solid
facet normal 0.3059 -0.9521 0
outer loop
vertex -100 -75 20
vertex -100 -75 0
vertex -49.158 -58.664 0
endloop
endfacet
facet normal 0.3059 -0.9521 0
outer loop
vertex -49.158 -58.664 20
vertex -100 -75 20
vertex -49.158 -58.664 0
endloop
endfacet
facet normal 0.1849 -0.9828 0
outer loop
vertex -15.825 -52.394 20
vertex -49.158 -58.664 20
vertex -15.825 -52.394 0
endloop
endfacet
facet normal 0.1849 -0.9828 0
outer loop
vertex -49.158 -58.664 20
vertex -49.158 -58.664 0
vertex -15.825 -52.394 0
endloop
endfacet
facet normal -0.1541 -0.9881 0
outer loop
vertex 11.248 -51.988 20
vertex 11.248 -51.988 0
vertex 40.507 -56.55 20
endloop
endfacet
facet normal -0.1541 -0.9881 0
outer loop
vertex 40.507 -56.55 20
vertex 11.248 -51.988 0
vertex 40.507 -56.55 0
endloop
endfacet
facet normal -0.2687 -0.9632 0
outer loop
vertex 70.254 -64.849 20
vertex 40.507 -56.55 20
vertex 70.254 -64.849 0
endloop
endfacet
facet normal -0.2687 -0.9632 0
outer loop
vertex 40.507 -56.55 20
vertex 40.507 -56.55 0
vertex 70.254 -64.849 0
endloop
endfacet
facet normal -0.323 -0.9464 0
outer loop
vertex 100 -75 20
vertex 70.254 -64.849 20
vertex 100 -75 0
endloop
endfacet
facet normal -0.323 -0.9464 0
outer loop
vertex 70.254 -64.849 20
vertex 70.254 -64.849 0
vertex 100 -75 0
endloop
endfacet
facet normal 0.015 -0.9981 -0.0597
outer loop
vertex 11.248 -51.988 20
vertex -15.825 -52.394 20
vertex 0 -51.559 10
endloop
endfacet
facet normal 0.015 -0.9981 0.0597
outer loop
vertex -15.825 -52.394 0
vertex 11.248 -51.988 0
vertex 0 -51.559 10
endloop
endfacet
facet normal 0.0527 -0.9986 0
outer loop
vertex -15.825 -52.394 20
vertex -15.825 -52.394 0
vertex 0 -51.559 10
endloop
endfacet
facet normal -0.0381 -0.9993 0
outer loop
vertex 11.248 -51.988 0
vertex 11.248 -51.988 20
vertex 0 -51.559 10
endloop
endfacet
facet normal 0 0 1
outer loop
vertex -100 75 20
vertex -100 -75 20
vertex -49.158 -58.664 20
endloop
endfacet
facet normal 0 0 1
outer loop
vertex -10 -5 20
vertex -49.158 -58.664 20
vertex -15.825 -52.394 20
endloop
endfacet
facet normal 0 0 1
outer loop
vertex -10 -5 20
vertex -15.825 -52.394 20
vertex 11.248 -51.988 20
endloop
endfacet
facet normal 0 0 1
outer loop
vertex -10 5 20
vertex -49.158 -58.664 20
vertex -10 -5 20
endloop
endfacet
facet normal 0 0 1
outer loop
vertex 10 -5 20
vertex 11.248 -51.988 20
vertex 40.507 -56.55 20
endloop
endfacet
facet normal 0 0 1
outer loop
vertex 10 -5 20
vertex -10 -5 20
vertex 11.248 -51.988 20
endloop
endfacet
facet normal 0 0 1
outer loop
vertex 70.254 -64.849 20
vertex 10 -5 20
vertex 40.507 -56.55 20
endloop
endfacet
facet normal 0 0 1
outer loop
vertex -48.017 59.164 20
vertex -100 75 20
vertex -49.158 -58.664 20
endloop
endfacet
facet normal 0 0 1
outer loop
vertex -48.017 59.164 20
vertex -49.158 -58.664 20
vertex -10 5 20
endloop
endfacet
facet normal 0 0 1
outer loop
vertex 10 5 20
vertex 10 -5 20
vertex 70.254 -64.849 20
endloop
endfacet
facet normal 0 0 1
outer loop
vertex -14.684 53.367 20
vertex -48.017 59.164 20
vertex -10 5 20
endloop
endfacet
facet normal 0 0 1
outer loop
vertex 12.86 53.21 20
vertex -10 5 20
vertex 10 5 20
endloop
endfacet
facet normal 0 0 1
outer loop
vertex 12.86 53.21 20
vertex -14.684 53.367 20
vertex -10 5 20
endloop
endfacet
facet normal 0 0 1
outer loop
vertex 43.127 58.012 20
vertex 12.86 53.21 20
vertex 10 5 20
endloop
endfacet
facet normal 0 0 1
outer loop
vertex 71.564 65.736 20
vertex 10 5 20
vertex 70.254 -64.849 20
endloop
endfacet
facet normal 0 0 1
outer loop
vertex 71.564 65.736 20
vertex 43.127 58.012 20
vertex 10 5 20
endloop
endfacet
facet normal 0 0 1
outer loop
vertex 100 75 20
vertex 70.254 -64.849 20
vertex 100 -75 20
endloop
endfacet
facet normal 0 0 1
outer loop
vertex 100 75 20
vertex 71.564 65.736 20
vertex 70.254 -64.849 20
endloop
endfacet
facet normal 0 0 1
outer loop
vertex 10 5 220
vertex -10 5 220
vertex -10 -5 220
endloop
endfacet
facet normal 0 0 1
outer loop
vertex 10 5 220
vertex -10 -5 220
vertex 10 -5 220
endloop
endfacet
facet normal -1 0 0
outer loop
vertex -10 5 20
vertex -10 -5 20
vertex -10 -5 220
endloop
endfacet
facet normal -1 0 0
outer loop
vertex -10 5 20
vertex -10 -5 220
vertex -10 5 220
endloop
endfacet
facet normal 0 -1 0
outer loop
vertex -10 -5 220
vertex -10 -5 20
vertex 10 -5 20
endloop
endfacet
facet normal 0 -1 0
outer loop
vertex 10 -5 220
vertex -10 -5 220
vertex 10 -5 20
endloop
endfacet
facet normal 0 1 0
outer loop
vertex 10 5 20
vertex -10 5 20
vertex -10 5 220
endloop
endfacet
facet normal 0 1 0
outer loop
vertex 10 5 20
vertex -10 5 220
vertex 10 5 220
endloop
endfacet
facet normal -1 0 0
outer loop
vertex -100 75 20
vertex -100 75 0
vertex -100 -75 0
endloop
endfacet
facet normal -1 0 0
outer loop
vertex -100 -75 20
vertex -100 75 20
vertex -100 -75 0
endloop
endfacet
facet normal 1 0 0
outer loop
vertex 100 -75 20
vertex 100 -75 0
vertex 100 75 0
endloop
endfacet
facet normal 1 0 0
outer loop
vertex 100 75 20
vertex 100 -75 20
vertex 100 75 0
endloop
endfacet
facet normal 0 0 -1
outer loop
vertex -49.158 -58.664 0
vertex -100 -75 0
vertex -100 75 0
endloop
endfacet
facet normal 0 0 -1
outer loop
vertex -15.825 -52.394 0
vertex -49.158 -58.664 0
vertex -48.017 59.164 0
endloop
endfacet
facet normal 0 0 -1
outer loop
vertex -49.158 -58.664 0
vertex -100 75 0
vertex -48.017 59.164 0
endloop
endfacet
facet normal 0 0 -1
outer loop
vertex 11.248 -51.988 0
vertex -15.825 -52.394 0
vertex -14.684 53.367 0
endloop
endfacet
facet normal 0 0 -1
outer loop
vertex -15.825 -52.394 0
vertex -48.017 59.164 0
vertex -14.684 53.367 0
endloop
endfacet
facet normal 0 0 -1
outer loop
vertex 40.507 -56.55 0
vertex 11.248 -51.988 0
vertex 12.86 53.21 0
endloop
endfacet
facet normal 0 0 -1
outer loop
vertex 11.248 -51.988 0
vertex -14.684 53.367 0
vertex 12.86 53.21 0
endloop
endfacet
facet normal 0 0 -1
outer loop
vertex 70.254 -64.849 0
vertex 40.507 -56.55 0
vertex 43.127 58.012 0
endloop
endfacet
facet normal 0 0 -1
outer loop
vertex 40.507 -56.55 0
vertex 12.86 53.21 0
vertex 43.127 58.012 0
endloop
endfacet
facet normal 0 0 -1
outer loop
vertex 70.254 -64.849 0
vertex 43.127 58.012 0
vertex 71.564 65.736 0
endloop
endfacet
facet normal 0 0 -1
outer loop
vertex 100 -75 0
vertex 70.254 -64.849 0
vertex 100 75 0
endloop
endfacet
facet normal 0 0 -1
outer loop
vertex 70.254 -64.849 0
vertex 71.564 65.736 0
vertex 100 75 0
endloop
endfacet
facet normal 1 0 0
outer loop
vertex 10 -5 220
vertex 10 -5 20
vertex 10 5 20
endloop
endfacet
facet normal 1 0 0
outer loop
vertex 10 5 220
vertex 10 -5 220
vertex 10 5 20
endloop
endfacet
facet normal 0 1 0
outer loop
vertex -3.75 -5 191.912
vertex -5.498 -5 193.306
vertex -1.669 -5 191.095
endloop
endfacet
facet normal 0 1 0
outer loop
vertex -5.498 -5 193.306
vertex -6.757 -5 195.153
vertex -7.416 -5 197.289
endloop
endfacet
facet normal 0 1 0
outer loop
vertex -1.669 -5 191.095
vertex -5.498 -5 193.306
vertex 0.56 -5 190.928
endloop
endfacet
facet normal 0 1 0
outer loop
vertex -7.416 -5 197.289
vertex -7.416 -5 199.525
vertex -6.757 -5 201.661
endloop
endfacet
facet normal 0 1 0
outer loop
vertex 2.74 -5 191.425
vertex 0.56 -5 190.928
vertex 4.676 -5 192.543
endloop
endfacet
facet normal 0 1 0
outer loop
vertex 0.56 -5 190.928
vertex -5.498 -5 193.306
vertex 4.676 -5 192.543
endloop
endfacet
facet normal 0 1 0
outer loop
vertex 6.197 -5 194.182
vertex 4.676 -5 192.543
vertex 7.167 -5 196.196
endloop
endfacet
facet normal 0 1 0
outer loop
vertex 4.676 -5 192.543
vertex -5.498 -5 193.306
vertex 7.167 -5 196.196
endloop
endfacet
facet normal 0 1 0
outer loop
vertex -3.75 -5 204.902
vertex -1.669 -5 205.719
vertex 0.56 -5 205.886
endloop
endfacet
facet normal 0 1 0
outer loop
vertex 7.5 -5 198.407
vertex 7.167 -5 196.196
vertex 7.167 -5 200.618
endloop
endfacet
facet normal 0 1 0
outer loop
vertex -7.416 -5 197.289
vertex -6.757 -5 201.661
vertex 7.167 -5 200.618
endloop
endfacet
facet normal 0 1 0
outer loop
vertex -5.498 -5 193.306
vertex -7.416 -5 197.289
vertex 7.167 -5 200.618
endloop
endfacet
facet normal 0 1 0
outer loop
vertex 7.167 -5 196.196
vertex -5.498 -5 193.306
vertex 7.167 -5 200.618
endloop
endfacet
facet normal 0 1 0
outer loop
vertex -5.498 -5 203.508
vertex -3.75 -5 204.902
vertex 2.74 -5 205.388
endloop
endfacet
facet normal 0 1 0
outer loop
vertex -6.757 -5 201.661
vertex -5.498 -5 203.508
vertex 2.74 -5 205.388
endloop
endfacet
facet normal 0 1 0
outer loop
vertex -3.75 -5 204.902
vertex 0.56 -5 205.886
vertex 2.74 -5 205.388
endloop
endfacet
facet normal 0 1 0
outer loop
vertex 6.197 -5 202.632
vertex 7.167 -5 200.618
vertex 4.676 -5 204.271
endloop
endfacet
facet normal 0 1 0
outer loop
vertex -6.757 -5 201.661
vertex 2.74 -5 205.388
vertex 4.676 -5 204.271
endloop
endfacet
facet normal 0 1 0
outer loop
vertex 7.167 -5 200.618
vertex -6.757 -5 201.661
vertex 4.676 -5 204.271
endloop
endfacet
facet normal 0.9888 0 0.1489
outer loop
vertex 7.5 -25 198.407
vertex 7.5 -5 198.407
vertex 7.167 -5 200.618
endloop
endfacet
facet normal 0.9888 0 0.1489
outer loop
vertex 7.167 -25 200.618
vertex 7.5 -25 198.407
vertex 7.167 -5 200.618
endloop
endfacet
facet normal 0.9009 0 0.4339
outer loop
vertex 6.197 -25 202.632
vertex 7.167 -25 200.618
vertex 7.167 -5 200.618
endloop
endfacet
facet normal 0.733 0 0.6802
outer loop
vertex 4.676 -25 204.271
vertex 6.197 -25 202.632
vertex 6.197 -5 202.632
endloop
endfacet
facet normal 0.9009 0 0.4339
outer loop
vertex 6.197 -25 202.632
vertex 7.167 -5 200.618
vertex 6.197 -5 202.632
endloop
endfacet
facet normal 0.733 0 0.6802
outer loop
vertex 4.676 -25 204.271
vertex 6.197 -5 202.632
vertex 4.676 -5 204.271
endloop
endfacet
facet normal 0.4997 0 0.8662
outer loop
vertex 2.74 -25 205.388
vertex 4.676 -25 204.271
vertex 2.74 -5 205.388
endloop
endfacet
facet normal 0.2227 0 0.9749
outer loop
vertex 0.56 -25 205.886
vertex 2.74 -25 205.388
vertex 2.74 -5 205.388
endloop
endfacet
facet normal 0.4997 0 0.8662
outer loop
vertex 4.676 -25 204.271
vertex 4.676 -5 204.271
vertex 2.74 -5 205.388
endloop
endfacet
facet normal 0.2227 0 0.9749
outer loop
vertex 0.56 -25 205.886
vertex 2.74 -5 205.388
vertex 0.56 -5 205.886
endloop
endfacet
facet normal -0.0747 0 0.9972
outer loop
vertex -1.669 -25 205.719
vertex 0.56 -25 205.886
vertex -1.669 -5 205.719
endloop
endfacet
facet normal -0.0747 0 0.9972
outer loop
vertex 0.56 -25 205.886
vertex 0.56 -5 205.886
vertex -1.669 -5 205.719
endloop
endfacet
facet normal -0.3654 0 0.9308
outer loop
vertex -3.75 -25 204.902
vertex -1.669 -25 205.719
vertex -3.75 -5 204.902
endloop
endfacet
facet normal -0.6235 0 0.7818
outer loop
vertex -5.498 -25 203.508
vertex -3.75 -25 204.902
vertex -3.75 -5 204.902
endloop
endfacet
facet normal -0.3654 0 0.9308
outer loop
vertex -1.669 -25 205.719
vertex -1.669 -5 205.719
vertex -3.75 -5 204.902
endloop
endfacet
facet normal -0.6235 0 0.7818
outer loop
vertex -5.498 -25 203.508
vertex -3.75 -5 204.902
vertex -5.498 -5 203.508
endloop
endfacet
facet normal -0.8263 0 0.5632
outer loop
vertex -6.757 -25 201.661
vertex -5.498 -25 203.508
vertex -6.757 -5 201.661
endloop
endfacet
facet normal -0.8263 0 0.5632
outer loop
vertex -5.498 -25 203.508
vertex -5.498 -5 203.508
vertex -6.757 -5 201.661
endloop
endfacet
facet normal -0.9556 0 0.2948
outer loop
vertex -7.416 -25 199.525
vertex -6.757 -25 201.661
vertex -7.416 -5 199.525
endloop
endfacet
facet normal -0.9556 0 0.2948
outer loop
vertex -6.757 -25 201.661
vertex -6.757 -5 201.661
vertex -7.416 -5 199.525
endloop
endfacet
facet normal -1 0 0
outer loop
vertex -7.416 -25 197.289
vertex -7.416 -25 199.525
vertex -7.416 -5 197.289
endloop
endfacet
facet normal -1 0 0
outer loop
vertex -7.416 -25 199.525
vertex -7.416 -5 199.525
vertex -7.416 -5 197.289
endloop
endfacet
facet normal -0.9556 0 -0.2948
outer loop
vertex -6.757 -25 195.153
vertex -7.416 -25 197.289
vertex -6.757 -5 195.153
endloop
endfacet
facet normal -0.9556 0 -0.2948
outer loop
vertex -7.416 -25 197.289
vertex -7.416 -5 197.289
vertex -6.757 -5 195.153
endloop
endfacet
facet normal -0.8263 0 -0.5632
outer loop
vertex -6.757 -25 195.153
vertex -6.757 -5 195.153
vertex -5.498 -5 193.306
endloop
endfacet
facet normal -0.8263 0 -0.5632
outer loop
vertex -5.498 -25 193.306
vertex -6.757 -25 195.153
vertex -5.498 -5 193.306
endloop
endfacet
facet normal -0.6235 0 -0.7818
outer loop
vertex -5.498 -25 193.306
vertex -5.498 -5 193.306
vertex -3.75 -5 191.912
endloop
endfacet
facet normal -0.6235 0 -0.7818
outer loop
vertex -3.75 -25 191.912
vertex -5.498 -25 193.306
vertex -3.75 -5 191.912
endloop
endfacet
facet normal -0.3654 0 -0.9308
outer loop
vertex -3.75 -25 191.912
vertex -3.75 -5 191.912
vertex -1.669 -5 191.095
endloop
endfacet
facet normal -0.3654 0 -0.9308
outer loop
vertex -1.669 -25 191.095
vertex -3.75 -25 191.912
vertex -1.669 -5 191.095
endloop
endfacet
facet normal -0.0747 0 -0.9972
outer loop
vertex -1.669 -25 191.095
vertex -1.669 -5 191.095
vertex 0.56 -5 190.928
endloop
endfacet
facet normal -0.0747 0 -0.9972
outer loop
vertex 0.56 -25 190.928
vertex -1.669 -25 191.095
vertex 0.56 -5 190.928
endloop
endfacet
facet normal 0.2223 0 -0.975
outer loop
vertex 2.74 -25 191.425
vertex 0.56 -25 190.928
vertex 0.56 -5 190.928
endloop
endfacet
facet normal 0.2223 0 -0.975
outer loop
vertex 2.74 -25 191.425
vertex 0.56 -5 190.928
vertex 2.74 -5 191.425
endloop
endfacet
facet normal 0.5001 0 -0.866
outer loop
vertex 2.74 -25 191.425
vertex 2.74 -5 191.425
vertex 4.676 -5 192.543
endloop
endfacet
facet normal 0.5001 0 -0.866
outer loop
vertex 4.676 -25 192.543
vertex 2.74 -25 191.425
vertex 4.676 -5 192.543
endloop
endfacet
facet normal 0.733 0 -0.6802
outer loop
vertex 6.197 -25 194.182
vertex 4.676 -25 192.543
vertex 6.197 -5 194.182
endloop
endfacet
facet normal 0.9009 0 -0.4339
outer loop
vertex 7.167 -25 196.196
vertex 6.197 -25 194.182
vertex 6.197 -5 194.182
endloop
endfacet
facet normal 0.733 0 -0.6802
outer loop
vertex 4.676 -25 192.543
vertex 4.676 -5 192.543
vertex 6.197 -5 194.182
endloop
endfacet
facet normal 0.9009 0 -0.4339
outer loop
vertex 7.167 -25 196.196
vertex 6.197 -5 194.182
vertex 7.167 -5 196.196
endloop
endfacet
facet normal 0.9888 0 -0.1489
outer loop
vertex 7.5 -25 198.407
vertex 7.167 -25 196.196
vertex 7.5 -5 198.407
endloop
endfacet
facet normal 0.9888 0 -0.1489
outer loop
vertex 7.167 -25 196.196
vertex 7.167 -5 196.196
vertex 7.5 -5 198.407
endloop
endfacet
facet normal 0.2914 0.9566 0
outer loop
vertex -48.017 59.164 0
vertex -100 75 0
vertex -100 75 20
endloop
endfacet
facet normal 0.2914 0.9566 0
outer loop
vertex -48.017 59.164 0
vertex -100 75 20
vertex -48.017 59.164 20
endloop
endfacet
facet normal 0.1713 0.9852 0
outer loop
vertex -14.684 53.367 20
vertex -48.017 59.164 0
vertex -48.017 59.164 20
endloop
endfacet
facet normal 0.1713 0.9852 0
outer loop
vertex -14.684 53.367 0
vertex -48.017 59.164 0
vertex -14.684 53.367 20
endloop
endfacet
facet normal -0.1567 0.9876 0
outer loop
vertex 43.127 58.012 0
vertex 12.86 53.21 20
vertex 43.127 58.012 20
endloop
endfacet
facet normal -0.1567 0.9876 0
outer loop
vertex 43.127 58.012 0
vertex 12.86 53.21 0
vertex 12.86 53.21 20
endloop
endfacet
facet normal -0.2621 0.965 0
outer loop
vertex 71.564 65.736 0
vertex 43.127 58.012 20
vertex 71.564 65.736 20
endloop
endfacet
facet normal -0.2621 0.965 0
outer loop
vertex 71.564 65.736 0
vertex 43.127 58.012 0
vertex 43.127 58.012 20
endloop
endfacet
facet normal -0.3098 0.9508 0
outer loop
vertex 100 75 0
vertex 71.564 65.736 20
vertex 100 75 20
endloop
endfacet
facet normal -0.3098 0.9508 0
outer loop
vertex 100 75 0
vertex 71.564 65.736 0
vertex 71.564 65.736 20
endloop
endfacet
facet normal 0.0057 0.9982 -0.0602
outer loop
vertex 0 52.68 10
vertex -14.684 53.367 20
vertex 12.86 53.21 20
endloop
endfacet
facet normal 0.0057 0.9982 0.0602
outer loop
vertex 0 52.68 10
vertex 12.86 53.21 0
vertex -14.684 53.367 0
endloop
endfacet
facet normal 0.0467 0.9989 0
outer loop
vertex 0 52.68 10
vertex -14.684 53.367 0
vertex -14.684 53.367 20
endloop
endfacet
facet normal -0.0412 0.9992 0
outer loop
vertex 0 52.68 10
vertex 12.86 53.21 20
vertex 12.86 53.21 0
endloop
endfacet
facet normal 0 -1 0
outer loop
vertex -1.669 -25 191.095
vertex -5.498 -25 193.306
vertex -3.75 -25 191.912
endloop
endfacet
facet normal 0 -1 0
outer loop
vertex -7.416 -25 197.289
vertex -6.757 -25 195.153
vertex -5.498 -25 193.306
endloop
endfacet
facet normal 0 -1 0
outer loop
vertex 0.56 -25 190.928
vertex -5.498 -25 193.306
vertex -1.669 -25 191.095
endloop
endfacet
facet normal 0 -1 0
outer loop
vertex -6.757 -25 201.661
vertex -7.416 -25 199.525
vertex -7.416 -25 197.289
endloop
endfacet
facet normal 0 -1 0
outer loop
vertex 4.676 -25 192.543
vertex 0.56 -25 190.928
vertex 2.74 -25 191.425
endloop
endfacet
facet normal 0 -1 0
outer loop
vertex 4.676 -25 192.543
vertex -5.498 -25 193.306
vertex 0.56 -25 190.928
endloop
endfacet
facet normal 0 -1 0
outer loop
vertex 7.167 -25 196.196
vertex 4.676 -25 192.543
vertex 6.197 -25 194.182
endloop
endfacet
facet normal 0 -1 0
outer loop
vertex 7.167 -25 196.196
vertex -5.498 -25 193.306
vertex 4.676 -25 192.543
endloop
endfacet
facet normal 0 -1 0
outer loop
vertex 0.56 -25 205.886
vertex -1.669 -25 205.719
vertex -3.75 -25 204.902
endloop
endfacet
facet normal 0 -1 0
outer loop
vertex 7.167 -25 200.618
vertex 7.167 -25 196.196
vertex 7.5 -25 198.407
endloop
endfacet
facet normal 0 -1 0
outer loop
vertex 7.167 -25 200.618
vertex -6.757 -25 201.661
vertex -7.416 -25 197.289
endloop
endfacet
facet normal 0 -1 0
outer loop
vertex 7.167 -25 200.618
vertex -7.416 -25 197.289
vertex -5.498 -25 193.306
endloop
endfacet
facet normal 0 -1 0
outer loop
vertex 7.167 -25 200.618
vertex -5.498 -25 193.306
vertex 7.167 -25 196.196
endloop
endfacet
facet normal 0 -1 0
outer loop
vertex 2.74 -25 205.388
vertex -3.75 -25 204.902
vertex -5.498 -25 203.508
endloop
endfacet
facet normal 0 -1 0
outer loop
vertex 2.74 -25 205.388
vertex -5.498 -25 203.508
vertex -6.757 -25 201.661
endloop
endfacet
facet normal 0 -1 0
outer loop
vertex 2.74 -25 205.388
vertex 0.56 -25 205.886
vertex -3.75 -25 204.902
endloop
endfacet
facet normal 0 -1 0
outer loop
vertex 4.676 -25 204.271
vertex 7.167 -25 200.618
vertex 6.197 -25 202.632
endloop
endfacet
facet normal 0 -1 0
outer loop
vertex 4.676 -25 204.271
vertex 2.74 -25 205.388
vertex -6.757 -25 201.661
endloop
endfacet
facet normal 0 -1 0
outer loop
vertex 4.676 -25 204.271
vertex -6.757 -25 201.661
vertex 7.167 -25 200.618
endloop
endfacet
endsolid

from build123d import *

# Parameters (mm, degrees)
F1_DEPTH = 20
F2_W     = 20
F2_H     = 10
F3_DEPTH = 200
F4_R     = 7.5
F5_DEPTH = 20


with BuildPart() as f1:
    # F0 (on Top) → F1 (new body)
    with BuildSketch(Plane.XY):
        with BuildLine():
            add(Edge.make_bspline(
                [(-100, -75), (-66.666667, -63.279746), (0, -39.839239), (66.666667, -63.279746), (100, -75)],
                knots=[0, 0, 0, 0, 102.710551, 205.421103, 205.421103, 205.421103, 205.421103], degree=3))
            Line((100, -75), (100, 75))
            add(Edge.make_bspline(
                [(-100, 75), (-66.666667, 63.84017), (0, 41.520509), (66.666667, 63.84017), (100, 75)],
                knots=[0, 0, 0, 0, 102.460564, 204.921129, 204.921129, 204.921129, 204.921129], degree=3))
            Line((-100, 75), (-100, -75))
        make_face()
    extrude(amount=F1_DEPTH)

    # F2 (on face) → F3 (join)
    with BuildSketch(Plane.XY.offset(20)):
        Rectangle(F2_W, F2_H)
    extrude(amount=F3_DEPTH)


with BuildPart() as f5:
    # F4 (on face) → F5 (new body)
    with BuildSketch(Plane.XZ.offset(5)):
        with Locations((0, 198.40689)):
            Circle(F4_R)
    extrude(amount=F5_DEPTH)


solid = Compound([f1.part, f5.part])
